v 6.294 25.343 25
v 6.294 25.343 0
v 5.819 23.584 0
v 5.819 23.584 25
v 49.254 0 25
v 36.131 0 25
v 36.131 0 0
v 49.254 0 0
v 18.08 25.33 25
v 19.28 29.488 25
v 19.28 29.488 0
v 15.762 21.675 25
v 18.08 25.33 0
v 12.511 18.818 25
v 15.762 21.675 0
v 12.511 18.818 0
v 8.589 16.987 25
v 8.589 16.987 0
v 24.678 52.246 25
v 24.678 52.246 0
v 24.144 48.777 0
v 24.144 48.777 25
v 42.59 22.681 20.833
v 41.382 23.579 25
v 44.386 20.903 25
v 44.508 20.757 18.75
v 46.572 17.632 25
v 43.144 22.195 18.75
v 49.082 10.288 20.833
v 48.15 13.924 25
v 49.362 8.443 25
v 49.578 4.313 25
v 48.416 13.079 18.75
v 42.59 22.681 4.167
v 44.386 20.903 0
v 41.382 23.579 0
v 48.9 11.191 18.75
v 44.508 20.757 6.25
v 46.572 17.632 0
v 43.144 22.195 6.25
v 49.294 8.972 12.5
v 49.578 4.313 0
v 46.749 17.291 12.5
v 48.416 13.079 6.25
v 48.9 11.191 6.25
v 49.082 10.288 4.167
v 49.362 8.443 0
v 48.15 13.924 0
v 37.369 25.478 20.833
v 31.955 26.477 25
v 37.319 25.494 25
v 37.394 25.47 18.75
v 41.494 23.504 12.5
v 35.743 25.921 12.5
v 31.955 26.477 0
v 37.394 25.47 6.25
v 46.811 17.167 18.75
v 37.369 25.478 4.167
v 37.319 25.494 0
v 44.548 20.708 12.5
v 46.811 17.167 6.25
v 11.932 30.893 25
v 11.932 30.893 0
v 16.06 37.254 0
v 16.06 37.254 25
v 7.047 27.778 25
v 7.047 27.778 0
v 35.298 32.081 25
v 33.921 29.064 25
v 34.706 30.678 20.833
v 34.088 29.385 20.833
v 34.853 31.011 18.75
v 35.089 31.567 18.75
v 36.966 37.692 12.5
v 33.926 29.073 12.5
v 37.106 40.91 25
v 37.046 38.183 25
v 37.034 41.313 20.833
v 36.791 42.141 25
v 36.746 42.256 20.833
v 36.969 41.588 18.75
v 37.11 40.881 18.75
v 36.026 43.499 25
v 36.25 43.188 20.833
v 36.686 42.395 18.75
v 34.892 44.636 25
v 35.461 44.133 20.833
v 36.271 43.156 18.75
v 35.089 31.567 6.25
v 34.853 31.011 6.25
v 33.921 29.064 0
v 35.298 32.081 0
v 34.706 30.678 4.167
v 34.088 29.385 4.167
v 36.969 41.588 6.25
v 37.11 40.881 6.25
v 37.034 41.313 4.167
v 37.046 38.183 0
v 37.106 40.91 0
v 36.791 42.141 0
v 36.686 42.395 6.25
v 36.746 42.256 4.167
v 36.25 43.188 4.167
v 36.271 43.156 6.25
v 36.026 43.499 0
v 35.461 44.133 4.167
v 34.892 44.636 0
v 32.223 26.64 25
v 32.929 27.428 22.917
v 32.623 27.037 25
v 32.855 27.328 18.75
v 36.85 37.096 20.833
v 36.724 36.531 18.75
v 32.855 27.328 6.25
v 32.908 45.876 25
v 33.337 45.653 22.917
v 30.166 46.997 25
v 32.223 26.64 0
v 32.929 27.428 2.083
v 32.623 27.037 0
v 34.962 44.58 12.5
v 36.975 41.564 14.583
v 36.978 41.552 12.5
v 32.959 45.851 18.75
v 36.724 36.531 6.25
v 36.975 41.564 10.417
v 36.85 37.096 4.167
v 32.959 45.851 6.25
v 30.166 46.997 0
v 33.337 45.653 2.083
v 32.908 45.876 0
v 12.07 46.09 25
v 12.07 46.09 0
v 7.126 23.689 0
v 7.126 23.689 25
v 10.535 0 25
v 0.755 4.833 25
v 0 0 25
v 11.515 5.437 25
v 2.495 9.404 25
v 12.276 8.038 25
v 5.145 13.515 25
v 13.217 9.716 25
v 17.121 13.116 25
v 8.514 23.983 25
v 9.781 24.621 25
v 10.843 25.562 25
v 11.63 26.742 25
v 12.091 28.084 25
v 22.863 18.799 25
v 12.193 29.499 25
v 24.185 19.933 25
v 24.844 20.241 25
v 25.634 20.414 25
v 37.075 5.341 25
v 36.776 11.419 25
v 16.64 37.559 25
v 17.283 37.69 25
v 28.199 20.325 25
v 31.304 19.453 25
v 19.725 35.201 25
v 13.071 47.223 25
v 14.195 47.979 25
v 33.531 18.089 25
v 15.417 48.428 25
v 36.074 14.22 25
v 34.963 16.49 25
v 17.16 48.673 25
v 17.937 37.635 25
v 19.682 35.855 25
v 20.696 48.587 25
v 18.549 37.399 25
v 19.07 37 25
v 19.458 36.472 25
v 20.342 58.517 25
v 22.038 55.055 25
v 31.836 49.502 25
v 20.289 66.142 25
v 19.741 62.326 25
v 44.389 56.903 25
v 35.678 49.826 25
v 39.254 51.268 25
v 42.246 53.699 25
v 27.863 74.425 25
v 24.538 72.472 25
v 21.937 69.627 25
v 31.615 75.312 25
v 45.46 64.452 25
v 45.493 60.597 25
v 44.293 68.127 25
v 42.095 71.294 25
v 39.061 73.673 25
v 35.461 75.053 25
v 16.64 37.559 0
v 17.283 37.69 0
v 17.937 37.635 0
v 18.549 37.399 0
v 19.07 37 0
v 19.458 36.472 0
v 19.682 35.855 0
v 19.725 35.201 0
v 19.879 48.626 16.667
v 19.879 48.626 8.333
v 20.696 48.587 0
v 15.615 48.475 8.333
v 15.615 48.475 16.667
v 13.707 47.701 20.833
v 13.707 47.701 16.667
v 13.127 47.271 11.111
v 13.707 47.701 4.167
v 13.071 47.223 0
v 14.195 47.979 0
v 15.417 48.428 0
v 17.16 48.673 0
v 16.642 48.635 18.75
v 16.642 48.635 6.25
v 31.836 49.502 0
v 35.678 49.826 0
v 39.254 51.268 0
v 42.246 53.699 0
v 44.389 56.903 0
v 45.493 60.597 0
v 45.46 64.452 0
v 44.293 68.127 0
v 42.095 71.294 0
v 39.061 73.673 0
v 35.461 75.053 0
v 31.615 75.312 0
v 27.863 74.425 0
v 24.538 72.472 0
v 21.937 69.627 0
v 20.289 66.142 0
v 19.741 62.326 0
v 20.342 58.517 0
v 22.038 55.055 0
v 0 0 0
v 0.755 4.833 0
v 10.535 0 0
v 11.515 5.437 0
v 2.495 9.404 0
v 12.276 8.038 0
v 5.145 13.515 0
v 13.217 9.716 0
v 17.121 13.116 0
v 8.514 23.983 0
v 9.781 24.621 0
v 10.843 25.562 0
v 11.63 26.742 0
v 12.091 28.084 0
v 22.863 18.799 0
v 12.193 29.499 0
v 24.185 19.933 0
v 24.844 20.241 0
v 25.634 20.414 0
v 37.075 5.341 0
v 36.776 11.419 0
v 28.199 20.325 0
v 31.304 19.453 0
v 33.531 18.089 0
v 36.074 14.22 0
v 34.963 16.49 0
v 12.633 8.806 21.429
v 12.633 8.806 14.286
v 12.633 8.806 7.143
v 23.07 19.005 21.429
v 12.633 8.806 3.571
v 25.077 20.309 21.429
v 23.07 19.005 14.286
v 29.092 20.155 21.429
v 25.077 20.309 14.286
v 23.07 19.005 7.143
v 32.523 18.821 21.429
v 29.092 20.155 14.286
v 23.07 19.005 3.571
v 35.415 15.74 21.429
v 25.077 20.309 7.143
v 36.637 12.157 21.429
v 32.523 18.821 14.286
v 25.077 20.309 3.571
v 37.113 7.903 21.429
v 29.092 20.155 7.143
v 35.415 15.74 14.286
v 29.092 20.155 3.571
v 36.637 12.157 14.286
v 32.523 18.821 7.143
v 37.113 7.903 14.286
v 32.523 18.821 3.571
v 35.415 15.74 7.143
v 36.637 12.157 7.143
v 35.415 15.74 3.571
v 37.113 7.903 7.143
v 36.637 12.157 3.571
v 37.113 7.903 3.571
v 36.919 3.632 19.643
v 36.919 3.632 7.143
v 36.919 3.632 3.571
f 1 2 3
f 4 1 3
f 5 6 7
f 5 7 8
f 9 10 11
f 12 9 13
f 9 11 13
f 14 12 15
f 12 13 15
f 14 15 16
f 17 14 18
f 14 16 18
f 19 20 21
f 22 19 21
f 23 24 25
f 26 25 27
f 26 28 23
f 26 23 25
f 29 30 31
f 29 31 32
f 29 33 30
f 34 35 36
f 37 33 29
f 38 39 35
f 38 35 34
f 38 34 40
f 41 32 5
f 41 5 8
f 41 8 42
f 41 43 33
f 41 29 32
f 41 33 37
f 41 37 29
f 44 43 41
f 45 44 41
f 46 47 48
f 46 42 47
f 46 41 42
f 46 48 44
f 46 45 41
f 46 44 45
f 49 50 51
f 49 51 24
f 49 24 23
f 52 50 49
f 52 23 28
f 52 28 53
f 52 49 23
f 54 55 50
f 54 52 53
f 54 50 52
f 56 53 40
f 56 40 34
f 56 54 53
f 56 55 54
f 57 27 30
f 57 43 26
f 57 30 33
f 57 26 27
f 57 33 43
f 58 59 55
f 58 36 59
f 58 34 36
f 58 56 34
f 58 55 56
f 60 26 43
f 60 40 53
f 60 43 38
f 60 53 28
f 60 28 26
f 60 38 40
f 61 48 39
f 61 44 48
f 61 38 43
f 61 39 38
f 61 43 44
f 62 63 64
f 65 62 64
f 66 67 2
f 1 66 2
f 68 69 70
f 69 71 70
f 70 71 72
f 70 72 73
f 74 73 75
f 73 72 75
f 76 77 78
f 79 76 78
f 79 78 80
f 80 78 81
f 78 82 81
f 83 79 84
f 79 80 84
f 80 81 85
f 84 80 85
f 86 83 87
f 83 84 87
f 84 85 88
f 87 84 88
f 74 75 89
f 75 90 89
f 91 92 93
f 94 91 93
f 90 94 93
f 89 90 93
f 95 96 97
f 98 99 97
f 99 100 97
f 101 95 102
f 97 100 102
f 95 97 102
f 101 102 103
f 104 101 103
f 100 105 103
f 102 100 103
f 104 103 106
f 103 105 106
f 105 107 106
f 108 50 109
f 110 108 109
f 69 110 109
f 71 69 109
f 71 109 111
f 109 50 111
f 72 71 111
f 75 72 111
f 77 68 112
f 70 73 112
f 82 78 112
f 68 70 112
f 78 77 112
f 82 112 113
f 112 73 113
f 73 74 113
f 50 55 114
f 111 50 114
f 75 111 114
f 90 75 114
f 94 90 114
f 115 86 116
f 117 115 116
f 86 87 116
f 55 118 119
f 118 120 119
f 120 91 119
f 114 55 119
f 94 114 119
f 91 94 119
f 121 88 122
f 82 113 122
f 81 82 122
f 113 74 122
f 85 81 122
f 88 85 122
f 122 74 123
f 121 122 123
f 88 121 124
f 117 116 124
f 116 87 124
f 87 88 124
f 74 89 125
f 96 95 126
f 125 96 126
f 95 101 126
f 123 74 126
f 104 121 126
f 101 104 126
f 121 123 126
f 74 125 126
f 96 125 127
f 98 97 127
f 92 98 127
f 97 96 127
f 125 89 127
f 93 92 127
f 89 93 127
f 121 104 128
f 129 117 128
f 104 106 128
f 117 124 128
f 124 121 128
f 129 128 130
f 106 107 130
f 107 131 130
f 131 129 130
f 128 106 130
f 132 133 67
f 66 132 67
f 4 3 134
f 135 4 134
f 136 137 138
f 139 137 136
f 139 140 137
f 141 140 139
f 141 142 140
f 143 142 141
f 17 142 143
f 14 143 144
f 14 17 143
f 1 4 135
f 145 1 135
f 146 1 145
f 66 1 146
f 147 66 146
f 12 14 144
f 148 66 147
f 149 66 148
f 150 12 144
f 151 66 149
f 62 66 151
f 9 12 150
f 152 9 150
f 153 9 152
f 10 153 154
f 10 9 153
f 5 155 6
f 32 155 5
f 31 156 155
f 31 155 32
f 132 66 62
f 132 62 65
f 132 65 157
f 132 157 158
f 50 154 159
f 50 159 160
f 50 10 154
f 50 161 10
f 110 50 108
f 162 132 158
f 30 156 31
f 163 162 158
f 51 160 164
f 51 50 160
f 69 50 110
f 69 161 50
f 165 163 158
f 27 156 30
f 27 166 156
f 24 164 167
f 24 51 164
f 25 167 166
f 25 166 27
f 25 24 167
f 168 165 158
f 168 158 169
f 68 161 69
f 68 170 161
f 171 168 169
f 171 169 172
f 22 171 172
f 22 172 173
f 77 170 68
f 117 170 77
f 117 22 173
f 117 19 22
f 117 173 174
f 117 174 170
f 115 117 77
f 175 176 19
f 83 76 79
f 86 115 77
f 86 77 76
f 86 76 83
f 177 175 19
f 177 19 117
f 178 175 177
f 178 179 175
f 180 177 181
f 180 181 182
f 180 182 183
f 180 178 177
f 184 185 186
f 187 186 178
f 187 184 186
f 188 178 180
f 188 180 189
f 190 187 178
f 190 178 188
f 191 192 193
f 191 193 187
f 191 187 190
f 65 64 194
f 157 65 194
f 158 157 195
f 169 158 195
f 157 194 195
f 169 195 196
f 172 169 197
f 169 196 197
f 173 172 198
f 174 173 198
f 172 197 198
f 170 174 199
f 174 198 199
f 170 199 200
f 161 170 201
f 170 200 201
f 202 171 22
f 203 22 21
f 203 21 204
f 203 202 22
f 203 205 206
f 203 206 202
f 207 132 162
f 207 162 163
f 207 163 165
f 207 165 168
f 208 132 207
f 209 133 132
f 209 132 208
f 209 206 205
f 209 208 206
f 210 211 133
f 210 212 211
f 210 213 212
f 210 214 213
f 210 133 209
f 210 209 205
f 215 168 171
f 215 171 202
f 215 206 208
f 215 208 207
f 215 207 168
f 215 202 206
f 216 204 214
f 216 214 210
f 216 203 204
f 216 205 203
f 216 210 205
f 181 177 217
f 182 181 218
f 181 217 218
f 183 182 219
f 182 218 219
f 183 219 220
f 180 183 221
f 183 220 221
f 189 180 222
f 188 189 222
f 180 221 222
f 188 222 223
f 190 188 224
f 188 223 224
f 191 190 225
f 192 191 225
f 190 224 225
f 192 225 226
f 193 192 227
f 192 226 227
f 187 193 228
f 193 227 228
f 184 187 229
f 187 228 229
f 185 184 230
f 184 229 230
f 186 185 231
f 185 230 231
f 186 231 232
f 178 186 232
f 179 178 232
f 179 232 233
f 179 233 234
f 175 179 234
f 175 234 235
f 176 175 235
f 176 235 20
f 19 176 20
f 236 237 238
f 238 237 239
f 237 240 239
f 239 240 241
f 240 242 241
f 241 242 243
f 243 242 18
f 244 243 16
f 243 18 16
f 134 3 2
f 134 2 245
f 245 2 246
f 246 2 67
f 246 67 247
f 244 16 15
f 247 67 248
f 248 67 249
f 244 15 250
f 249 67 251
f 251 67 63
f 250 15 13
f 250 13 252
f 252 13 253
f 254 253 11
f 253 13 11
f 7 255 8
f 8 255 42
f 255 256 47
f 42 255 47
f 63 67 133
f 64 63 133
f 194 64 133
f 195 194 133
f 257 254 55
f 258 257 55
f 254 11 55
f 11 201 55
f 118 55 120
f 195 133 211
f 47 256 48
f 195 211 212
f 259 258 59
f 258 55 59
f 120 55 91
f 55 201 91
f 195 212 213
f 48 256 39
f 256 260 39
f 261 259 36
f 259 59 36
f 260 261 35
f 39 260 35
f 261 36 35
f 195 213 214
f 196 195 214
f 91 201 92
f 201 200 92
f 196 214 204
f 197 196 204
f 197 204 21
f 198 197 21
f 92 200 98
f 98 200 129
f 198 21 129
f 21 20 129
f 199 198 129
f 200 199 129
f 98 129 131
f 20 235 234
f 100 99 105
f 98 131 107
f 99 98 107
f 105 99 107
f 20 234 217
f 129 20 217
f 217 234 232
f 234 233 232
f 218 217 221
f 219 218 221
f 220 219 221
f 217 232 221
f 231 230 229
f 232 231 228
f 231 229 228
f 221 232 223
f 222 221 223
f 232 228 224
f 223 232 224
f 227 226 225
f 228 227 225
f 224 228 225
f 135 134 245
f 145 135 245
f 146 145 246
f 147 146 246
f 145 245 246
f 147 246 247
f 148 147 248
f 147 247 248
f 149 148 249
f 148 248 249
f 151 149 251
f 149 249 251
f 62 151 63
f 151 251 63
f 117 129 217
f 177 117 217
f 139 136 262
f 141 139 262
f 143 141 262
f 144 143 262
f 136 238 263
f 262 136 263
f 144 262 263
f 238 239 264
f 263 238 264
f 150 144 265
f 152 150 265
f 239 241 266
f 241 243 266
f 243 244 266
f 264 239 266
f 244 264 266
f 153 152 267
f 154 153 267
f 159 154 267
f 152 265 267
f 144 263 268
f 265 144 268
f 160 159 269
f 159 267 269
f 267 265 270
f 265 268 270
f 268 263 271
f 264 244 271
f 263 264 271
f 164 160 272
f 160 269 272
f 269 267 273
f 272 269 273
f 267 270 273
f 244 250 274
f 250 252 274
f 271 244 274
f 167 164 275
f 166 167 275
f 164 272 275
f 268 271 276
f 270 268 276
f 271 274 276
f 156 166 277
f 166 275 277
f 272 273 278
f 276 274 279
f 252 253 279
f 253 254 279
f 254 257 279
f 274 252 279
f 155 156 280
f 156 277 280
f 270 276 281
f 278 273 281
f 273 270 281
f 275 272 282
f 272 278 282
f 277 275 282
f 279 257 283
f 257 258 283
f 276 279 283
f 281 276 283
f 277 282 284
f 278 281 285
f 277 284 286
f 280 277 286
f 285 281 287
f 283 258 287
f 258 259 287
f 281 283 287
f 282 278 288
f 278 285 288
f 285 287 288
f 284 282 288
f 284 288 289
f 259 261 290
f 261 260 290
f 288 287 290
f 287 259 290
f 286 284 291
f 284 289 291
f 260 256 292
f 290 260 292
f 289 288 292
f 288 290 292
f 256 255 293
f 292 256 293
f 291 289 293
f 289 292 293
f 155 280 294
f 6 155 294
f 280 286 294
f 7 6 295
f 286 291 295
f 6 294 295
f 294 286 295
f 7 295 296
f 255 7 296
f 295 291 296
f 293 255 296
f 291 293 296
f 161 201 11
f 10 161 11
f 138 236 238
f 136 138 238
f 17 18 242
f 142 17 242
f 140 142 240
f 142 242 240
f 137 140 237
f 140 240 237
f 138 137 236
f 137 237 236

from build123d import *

# Parameters (mm, degrees)
F1_DEPTH = 25


with BuildPart() as f1:
    # F0 (on Top) → F1 (new body)
    with BuildSketch(Plane.XY):
        with BuildLine():
            ThreePointArc((19.2801989566, 29.4877570077), (15.7615253624, 21.6751466425), (8.5894693106, 16.986910666))
            ThreePointArc((8.5894693106, 16.986910666), (2.4947531013, 9.4036200252), (0, 0))
            Line((0, 0), (10.5349682271, 0))
            add(Edge.make_bspline(
                [(10.5349682271, 0), (11.105931155, 2.6194903291), (11.609049317, 9.7140045073), (17.4467370521, 12.7575176791), (22.9096103398, 19.0566540962), (24.9614081671, 20.5978465085), (29.4556638689, 20.4467125472), (37.5969536435, 17.0035284008), (37.5440217848, 4.1246412968), (36.1309349537, 0)],
                knots=[0, 0, 0, 0, 0.1608800501, 0.2975672627, 0.4493616304, 0.5320765568, 0.6392666155, 0.7877496125, 1, 1, 1, 1], degree=3))
            Line((36.1309349537, 0), (49.2538735271, 0))
            add(Edge.make_bspline(
                [(31.9554582238, 26.4774169773), (40.2781709108, 25.8469083807), (48.2995089052, 18.4280773445), (50.1337396114, 6.4297131631), (49.2538735271, 0)],
                knots=[0, 0, 0, 0, 0.4995794266, 1, 1, 1, 1], degree=3))
            add(Edge.make_bspline(
                [(31.9554582238, 26.4774169773), (33.32298356, 27.0244262551), (38.9179600405, 39.1833432434), (36.6028611169, 44.8108039036), (30.1659647375, 46.9969213009)],
                knots=[0, 0, 0, 0, 0.50795539, 1, 1, 1, 1], degree=3))
            Line((30.1659647375, 46.9969213009), (31.836155802, 49.5022088289))
            ThreePointArc((31.836155802, 49.5022088289), (37.3130534041, 74.498168744), (24.6781911701, 52.2460974753))
            Line((24.6781911701, 52.2460974753), (24.1441342906, 48.7770544229))
            add(Edge.make_bspline(
                [(12.0699045525, 46.0898235351), (15.0149352859, 50.3373034286), (20.1193910442, 47.881310794), (24.1441342906, 48.7770544229)],
                knots=[0, 0, 0, 0, 12.3696496964, 12.3696496964, 12.3696496964, 12.3696496964], degree=3))
            Line((12.0699045525, 46.0898235351), (7.0473597889, 27.7782059473))
            Line((7.0473597889, 27.7782059473), (6.29418949, 25.3428798244))
            Line((6.29418949, 25.3428798244), (5.8190694864, 23.5838141952))
            Line((5.8190694864, 23.5838141952), (7.1263574098, 23.688590162))
            ThreePointArc((7.1263574098, 23.688590162), (11.274887215, 26.1262666727), (11.932000518, 30.8928973929))
            Line((11.932000518, 30.8928973929), (16.0600062607, 37.2537732479))
            ThreePointArc((16.0600062607, 37.2537732479), (18.5485676073, 37.398785834), (19.7245021973, 35.2007994678))
            Line((19.7245021973, 35.2007994678), (19.2801989566, 29.4877570077))
        make_face()
    extrude(amount=F1_DEPTH)


solid = f1.part
